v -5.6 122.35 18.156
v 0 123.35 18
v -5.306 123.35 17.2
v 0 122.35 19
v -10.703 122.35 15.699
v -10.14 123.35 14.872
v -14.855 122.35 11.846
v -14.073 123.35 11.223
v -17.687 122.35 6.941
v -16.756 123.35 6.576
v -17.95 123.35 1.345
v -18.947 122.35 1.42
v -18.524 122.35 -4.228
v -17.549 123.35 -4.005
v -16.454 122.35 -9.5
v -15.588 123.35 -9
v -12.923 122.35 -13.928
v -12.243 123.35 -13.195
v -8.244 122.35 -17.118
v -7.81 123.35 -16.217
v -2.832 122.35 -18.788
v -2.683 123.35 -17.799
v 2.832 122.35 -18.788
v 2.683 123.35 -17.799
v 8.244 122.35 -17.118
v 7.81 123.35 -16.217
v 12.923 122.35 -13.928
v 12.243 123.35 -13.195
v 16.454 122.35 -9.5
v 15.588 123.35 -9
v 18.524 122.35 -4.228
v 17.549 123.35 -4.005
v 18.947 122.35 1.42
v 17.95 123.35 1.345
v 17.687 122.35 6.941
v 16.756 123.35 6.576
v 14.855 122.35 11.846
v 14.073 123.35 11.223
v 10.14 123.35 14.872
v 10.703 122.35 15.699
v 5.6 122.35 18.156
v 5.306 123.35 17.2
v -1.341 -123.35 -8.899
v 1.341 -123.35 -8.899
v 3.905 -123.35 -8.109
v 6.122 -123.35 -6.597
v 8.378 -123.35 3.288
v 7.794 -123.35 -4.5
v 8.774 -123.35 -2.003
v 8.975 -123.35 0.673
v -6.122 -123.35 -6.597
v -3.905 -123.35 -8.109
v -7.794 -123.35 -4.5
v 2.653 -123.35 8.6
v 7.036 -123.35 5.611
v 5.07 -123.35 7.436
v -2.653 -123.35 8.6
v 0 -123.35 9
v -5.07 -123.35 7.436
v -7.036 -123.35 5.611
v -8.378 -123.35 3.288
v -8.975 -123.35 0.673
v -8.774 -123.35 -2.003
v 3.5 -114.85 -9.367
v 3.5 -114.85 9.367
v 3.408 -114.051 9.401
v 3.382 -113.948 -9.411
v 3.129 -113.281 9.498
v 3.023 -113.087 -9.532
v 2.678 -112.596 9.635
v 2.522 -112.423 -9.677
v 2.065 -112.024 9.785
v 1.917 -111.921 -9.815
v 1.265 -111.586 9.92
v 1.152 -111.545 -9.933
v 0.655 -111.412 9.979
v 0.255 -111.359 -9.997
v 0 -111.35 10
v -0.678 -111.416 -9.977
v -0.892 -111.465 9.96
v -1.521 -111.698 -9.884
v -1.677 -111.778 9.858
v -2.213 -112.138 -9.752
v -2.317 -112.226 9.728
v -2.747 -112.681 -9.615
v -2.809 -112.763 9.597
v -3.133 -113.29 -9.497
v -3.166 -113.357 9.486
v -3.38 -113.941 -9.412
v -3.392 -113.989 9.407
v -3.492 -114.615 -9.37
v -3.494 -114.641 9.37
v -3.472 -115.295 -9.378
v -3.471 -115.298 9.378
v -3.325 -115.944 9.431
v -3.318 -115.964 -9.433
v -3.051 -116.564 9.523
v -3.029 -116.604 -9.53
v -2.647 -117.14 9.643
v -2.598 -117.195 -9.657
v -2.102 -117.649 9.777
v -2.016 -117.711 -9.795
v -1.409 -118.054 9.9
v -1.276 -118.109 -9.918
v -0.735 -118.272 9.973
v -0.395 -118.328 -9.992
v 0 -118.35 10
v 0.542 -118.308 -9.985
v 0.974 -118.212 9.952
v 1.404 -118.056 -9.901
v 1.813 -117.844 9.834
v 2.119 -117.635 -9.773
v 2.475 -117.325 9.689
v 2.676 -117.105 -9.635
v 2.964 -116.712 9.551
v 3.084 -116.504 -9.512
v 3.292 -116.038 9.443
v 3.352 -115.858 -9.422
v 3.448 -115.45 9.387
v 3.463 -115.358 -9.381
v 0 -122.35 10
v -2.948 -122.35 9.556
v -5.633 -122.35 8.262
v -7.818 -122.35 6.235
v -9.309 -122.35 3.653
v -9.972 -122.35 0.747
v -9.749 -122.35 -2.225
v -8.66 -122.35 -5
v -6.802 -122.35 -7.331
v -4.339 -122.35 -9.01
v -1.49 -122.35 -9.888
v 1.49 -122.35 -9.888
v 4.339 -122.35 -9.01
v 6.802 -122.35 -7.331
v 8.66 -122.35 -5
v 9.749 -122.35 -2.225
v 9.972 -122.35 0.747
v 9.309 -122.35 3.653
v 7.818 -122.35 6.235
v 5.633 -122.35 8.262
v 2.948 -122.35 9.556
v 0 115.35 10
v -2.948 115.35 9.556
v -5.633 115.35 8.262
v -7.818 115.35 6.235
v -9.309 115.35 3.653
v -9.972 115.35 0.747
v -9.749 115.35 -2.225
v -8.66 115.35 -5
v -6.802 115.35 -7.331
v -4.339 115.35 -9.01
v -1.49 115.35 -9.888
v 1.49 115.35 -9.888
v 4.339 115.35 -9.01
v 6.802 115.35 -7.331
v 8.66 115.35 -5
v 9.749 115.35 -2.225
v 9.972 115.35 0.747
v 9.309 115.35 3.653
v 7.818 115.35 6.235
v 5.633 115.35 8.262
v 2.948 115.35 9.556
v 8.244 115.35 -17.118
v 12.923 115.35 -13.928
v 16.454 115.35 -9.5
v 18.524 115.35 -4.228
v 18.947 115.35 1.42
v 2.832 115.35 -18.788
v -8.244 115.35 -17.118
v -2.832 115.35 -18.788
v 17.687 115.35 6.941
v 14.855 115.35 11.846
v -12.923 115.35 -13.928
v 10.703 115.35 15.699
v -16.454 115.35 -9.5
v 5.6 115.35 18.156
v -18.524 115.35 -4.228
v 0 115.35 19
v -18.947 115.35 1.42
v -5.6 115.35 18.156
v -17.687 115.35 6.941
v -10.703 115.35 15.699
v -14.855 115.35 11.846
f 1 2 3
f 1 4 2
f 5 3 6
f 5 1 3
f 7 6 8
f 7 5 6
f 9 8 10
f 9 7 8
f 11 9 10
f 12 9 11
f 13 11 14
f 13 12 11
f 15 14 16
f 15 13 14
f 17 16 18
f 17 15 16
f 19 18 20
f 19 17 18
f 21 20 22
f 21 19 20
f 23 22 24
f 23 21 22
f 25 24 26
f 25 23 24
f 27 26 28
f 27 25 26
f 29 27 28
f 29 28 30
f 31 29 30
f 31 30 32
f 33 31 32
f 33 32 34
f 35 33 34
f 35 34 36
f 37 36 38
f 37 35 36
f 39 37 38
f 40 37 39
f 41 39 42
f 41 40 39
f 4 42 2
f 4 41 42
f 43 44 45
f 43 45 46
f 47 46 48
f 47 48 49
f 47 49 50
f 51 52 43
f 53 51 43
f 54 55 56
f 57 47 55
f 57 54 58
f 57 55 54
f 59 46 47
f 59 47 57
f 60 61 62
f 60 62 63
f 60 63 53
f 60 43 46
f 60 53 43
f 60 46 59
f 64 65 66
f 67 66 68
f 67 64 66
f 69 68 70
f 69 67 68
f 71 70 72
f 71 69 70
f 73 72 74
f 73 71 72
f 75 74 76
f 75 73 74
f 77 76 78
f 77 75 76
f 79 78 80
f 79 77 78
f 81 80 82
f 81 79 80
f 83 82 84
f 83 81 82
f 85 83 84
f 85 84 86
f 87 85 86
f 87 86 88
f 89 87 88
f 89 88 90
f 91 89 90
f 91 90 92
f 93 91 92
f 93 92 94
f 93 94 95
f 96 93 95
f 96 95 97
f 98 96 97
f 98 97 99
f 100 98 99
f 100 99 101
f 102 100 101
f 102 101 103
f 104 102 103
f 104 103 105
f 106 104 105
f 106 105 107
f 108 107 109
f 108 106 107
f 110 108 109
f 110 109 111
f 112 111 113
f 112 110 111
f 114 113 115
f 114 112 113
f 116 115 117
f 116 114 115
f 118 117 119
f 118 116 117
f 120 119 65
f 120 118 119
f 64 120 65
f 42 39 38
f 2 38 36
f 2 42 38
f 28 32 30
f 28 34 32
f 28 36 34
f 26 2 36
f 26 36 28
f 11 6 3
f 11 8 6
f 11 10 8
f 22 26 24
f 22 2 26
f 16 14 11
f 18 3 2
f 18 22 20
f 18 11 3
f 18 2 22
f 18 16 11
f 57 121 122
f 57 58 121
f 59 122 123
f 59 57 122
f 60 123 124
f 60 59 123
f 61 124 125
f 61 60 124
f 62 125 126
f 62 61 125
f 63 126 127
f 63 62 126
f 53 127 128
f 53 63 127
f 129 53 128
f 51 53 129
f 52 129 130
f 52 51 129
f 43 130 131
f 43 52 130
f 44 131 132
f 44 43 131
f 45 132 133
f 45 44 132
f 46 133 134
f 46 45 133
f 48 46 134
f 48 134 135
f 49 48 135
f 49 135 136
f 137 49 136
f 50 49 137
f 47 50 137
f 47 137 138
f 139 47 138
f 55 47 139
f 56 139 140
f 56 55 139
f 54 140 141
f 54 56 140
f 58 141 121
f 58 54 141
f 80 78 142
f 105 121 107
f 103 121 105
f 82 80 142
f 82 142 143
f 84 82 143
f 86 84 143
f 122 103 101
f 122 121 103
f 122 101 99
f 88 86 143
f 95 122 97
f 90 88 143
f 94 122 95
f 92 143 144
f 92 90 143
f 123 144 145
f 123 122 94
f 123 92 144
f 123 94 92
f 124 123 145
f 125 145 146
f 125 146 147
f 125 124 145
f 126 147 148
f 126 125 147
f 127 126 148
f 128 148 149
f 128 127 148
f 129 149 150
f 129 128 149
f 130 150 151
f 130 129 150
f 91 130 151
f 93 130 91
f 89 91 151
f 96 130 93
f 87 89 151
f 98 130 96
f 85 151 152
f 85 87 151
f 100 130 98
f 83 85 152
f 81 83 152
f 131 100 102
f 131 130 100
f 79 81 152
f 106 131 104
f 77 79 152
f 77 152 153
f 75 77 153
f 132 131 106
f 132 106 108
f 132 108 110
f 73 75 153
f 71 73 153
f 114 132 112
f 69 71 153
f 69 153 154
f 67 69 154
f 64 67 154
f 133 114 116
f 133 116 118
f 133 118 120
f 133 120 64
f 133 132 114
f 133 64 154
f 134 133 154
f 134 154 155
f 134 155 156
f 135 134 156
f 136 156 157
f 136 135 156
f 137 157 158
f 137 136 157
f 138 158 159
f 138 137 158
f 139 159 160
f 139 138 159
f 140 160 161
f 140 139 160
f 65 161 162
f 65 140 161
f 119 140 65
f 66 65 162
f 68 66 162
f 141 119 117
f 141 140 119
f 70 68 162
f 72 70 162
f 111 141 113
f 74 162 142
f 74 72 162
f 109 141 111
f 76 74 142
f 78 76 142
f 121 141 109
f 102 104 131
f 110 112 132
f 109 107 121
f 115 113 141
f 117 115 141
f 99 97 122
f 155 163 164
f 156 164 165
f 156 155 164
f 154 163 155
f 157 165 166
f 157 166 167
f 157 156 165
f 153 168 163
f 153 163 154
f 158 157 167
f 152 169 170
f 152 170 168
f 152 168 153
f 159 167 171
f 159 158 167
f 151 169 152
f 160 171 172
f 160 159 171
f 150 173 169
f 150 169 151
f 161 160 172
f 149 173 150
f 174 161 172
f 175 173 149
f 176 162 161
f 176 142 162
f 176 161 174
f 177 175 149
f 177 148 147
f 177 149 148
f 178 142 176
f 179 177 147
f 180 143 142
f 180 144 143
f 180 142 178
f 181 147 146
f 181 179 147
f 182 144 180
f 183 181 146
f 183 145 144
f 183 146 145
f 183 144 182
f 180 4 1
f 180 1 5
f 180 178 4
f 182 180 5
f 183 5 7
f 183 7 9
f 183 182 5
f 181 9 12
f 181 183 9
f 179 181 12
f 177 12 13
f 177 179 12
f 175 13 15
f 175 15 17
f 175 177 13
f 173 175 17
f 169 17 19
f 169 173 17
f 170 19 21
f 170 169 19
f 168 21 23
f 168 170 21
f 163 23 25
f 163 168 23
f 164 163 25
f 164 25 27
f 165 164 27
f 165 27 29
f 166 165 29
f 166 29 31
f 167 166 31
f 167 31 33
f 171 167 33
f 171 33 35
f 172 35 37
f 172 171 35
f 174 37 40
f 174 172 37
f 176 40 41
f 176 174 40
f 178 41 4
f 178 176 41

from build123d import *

# Parameters (mm, degrees)
CORTE_EXTRUS_O1_DEPTH      = 127.242712661
CORTE_EXTRUS_O1_DEPTH_BACK = 127.242712661
ESBO_O2_R                  = 3.5


with BuildPart() as part:
    # Esboço1 → Revolução1 (revolve)
    with BuildSketch(Plane(origin=(0, 0, 0), x_dir=(0, 0, -1), z_dir=(1, 0, 0)), mode=Mode.PRIVATE) as revolu_o1_sk:
        Polygon((0, 123.35), (18, 123.35), (19, 122.35), (19, 115.35), (10, 115.35), (10, -122.35), (9, -123.35), (0, -123.35), align=None)
    revolve(revolu_o1_sk.sketch.rotate(Axis((0, 123.35, 0), (0, -1, 0)), 180), axis=Axis((0, 123.35, 0), (0, -1, 0)))

    # Esboço2 → Corte-extrusão1 (cut, two sides: drawn at the far end of the back side and taken through both)
    with BuildSketch(Plane.XY.offset(-CORTE_EXTRUS_O1_DEPTH_BACK)):
        with Locations((0, -114.85)):
            Circle(ESBO_O2_R)
    extrude(amount=CORTE_EXTRUS_O1_DEPTH + CORTE_EXTRUS_O1_DEPTH_BACK, mode=Mode.SUBTRACT)


solid = part.part
